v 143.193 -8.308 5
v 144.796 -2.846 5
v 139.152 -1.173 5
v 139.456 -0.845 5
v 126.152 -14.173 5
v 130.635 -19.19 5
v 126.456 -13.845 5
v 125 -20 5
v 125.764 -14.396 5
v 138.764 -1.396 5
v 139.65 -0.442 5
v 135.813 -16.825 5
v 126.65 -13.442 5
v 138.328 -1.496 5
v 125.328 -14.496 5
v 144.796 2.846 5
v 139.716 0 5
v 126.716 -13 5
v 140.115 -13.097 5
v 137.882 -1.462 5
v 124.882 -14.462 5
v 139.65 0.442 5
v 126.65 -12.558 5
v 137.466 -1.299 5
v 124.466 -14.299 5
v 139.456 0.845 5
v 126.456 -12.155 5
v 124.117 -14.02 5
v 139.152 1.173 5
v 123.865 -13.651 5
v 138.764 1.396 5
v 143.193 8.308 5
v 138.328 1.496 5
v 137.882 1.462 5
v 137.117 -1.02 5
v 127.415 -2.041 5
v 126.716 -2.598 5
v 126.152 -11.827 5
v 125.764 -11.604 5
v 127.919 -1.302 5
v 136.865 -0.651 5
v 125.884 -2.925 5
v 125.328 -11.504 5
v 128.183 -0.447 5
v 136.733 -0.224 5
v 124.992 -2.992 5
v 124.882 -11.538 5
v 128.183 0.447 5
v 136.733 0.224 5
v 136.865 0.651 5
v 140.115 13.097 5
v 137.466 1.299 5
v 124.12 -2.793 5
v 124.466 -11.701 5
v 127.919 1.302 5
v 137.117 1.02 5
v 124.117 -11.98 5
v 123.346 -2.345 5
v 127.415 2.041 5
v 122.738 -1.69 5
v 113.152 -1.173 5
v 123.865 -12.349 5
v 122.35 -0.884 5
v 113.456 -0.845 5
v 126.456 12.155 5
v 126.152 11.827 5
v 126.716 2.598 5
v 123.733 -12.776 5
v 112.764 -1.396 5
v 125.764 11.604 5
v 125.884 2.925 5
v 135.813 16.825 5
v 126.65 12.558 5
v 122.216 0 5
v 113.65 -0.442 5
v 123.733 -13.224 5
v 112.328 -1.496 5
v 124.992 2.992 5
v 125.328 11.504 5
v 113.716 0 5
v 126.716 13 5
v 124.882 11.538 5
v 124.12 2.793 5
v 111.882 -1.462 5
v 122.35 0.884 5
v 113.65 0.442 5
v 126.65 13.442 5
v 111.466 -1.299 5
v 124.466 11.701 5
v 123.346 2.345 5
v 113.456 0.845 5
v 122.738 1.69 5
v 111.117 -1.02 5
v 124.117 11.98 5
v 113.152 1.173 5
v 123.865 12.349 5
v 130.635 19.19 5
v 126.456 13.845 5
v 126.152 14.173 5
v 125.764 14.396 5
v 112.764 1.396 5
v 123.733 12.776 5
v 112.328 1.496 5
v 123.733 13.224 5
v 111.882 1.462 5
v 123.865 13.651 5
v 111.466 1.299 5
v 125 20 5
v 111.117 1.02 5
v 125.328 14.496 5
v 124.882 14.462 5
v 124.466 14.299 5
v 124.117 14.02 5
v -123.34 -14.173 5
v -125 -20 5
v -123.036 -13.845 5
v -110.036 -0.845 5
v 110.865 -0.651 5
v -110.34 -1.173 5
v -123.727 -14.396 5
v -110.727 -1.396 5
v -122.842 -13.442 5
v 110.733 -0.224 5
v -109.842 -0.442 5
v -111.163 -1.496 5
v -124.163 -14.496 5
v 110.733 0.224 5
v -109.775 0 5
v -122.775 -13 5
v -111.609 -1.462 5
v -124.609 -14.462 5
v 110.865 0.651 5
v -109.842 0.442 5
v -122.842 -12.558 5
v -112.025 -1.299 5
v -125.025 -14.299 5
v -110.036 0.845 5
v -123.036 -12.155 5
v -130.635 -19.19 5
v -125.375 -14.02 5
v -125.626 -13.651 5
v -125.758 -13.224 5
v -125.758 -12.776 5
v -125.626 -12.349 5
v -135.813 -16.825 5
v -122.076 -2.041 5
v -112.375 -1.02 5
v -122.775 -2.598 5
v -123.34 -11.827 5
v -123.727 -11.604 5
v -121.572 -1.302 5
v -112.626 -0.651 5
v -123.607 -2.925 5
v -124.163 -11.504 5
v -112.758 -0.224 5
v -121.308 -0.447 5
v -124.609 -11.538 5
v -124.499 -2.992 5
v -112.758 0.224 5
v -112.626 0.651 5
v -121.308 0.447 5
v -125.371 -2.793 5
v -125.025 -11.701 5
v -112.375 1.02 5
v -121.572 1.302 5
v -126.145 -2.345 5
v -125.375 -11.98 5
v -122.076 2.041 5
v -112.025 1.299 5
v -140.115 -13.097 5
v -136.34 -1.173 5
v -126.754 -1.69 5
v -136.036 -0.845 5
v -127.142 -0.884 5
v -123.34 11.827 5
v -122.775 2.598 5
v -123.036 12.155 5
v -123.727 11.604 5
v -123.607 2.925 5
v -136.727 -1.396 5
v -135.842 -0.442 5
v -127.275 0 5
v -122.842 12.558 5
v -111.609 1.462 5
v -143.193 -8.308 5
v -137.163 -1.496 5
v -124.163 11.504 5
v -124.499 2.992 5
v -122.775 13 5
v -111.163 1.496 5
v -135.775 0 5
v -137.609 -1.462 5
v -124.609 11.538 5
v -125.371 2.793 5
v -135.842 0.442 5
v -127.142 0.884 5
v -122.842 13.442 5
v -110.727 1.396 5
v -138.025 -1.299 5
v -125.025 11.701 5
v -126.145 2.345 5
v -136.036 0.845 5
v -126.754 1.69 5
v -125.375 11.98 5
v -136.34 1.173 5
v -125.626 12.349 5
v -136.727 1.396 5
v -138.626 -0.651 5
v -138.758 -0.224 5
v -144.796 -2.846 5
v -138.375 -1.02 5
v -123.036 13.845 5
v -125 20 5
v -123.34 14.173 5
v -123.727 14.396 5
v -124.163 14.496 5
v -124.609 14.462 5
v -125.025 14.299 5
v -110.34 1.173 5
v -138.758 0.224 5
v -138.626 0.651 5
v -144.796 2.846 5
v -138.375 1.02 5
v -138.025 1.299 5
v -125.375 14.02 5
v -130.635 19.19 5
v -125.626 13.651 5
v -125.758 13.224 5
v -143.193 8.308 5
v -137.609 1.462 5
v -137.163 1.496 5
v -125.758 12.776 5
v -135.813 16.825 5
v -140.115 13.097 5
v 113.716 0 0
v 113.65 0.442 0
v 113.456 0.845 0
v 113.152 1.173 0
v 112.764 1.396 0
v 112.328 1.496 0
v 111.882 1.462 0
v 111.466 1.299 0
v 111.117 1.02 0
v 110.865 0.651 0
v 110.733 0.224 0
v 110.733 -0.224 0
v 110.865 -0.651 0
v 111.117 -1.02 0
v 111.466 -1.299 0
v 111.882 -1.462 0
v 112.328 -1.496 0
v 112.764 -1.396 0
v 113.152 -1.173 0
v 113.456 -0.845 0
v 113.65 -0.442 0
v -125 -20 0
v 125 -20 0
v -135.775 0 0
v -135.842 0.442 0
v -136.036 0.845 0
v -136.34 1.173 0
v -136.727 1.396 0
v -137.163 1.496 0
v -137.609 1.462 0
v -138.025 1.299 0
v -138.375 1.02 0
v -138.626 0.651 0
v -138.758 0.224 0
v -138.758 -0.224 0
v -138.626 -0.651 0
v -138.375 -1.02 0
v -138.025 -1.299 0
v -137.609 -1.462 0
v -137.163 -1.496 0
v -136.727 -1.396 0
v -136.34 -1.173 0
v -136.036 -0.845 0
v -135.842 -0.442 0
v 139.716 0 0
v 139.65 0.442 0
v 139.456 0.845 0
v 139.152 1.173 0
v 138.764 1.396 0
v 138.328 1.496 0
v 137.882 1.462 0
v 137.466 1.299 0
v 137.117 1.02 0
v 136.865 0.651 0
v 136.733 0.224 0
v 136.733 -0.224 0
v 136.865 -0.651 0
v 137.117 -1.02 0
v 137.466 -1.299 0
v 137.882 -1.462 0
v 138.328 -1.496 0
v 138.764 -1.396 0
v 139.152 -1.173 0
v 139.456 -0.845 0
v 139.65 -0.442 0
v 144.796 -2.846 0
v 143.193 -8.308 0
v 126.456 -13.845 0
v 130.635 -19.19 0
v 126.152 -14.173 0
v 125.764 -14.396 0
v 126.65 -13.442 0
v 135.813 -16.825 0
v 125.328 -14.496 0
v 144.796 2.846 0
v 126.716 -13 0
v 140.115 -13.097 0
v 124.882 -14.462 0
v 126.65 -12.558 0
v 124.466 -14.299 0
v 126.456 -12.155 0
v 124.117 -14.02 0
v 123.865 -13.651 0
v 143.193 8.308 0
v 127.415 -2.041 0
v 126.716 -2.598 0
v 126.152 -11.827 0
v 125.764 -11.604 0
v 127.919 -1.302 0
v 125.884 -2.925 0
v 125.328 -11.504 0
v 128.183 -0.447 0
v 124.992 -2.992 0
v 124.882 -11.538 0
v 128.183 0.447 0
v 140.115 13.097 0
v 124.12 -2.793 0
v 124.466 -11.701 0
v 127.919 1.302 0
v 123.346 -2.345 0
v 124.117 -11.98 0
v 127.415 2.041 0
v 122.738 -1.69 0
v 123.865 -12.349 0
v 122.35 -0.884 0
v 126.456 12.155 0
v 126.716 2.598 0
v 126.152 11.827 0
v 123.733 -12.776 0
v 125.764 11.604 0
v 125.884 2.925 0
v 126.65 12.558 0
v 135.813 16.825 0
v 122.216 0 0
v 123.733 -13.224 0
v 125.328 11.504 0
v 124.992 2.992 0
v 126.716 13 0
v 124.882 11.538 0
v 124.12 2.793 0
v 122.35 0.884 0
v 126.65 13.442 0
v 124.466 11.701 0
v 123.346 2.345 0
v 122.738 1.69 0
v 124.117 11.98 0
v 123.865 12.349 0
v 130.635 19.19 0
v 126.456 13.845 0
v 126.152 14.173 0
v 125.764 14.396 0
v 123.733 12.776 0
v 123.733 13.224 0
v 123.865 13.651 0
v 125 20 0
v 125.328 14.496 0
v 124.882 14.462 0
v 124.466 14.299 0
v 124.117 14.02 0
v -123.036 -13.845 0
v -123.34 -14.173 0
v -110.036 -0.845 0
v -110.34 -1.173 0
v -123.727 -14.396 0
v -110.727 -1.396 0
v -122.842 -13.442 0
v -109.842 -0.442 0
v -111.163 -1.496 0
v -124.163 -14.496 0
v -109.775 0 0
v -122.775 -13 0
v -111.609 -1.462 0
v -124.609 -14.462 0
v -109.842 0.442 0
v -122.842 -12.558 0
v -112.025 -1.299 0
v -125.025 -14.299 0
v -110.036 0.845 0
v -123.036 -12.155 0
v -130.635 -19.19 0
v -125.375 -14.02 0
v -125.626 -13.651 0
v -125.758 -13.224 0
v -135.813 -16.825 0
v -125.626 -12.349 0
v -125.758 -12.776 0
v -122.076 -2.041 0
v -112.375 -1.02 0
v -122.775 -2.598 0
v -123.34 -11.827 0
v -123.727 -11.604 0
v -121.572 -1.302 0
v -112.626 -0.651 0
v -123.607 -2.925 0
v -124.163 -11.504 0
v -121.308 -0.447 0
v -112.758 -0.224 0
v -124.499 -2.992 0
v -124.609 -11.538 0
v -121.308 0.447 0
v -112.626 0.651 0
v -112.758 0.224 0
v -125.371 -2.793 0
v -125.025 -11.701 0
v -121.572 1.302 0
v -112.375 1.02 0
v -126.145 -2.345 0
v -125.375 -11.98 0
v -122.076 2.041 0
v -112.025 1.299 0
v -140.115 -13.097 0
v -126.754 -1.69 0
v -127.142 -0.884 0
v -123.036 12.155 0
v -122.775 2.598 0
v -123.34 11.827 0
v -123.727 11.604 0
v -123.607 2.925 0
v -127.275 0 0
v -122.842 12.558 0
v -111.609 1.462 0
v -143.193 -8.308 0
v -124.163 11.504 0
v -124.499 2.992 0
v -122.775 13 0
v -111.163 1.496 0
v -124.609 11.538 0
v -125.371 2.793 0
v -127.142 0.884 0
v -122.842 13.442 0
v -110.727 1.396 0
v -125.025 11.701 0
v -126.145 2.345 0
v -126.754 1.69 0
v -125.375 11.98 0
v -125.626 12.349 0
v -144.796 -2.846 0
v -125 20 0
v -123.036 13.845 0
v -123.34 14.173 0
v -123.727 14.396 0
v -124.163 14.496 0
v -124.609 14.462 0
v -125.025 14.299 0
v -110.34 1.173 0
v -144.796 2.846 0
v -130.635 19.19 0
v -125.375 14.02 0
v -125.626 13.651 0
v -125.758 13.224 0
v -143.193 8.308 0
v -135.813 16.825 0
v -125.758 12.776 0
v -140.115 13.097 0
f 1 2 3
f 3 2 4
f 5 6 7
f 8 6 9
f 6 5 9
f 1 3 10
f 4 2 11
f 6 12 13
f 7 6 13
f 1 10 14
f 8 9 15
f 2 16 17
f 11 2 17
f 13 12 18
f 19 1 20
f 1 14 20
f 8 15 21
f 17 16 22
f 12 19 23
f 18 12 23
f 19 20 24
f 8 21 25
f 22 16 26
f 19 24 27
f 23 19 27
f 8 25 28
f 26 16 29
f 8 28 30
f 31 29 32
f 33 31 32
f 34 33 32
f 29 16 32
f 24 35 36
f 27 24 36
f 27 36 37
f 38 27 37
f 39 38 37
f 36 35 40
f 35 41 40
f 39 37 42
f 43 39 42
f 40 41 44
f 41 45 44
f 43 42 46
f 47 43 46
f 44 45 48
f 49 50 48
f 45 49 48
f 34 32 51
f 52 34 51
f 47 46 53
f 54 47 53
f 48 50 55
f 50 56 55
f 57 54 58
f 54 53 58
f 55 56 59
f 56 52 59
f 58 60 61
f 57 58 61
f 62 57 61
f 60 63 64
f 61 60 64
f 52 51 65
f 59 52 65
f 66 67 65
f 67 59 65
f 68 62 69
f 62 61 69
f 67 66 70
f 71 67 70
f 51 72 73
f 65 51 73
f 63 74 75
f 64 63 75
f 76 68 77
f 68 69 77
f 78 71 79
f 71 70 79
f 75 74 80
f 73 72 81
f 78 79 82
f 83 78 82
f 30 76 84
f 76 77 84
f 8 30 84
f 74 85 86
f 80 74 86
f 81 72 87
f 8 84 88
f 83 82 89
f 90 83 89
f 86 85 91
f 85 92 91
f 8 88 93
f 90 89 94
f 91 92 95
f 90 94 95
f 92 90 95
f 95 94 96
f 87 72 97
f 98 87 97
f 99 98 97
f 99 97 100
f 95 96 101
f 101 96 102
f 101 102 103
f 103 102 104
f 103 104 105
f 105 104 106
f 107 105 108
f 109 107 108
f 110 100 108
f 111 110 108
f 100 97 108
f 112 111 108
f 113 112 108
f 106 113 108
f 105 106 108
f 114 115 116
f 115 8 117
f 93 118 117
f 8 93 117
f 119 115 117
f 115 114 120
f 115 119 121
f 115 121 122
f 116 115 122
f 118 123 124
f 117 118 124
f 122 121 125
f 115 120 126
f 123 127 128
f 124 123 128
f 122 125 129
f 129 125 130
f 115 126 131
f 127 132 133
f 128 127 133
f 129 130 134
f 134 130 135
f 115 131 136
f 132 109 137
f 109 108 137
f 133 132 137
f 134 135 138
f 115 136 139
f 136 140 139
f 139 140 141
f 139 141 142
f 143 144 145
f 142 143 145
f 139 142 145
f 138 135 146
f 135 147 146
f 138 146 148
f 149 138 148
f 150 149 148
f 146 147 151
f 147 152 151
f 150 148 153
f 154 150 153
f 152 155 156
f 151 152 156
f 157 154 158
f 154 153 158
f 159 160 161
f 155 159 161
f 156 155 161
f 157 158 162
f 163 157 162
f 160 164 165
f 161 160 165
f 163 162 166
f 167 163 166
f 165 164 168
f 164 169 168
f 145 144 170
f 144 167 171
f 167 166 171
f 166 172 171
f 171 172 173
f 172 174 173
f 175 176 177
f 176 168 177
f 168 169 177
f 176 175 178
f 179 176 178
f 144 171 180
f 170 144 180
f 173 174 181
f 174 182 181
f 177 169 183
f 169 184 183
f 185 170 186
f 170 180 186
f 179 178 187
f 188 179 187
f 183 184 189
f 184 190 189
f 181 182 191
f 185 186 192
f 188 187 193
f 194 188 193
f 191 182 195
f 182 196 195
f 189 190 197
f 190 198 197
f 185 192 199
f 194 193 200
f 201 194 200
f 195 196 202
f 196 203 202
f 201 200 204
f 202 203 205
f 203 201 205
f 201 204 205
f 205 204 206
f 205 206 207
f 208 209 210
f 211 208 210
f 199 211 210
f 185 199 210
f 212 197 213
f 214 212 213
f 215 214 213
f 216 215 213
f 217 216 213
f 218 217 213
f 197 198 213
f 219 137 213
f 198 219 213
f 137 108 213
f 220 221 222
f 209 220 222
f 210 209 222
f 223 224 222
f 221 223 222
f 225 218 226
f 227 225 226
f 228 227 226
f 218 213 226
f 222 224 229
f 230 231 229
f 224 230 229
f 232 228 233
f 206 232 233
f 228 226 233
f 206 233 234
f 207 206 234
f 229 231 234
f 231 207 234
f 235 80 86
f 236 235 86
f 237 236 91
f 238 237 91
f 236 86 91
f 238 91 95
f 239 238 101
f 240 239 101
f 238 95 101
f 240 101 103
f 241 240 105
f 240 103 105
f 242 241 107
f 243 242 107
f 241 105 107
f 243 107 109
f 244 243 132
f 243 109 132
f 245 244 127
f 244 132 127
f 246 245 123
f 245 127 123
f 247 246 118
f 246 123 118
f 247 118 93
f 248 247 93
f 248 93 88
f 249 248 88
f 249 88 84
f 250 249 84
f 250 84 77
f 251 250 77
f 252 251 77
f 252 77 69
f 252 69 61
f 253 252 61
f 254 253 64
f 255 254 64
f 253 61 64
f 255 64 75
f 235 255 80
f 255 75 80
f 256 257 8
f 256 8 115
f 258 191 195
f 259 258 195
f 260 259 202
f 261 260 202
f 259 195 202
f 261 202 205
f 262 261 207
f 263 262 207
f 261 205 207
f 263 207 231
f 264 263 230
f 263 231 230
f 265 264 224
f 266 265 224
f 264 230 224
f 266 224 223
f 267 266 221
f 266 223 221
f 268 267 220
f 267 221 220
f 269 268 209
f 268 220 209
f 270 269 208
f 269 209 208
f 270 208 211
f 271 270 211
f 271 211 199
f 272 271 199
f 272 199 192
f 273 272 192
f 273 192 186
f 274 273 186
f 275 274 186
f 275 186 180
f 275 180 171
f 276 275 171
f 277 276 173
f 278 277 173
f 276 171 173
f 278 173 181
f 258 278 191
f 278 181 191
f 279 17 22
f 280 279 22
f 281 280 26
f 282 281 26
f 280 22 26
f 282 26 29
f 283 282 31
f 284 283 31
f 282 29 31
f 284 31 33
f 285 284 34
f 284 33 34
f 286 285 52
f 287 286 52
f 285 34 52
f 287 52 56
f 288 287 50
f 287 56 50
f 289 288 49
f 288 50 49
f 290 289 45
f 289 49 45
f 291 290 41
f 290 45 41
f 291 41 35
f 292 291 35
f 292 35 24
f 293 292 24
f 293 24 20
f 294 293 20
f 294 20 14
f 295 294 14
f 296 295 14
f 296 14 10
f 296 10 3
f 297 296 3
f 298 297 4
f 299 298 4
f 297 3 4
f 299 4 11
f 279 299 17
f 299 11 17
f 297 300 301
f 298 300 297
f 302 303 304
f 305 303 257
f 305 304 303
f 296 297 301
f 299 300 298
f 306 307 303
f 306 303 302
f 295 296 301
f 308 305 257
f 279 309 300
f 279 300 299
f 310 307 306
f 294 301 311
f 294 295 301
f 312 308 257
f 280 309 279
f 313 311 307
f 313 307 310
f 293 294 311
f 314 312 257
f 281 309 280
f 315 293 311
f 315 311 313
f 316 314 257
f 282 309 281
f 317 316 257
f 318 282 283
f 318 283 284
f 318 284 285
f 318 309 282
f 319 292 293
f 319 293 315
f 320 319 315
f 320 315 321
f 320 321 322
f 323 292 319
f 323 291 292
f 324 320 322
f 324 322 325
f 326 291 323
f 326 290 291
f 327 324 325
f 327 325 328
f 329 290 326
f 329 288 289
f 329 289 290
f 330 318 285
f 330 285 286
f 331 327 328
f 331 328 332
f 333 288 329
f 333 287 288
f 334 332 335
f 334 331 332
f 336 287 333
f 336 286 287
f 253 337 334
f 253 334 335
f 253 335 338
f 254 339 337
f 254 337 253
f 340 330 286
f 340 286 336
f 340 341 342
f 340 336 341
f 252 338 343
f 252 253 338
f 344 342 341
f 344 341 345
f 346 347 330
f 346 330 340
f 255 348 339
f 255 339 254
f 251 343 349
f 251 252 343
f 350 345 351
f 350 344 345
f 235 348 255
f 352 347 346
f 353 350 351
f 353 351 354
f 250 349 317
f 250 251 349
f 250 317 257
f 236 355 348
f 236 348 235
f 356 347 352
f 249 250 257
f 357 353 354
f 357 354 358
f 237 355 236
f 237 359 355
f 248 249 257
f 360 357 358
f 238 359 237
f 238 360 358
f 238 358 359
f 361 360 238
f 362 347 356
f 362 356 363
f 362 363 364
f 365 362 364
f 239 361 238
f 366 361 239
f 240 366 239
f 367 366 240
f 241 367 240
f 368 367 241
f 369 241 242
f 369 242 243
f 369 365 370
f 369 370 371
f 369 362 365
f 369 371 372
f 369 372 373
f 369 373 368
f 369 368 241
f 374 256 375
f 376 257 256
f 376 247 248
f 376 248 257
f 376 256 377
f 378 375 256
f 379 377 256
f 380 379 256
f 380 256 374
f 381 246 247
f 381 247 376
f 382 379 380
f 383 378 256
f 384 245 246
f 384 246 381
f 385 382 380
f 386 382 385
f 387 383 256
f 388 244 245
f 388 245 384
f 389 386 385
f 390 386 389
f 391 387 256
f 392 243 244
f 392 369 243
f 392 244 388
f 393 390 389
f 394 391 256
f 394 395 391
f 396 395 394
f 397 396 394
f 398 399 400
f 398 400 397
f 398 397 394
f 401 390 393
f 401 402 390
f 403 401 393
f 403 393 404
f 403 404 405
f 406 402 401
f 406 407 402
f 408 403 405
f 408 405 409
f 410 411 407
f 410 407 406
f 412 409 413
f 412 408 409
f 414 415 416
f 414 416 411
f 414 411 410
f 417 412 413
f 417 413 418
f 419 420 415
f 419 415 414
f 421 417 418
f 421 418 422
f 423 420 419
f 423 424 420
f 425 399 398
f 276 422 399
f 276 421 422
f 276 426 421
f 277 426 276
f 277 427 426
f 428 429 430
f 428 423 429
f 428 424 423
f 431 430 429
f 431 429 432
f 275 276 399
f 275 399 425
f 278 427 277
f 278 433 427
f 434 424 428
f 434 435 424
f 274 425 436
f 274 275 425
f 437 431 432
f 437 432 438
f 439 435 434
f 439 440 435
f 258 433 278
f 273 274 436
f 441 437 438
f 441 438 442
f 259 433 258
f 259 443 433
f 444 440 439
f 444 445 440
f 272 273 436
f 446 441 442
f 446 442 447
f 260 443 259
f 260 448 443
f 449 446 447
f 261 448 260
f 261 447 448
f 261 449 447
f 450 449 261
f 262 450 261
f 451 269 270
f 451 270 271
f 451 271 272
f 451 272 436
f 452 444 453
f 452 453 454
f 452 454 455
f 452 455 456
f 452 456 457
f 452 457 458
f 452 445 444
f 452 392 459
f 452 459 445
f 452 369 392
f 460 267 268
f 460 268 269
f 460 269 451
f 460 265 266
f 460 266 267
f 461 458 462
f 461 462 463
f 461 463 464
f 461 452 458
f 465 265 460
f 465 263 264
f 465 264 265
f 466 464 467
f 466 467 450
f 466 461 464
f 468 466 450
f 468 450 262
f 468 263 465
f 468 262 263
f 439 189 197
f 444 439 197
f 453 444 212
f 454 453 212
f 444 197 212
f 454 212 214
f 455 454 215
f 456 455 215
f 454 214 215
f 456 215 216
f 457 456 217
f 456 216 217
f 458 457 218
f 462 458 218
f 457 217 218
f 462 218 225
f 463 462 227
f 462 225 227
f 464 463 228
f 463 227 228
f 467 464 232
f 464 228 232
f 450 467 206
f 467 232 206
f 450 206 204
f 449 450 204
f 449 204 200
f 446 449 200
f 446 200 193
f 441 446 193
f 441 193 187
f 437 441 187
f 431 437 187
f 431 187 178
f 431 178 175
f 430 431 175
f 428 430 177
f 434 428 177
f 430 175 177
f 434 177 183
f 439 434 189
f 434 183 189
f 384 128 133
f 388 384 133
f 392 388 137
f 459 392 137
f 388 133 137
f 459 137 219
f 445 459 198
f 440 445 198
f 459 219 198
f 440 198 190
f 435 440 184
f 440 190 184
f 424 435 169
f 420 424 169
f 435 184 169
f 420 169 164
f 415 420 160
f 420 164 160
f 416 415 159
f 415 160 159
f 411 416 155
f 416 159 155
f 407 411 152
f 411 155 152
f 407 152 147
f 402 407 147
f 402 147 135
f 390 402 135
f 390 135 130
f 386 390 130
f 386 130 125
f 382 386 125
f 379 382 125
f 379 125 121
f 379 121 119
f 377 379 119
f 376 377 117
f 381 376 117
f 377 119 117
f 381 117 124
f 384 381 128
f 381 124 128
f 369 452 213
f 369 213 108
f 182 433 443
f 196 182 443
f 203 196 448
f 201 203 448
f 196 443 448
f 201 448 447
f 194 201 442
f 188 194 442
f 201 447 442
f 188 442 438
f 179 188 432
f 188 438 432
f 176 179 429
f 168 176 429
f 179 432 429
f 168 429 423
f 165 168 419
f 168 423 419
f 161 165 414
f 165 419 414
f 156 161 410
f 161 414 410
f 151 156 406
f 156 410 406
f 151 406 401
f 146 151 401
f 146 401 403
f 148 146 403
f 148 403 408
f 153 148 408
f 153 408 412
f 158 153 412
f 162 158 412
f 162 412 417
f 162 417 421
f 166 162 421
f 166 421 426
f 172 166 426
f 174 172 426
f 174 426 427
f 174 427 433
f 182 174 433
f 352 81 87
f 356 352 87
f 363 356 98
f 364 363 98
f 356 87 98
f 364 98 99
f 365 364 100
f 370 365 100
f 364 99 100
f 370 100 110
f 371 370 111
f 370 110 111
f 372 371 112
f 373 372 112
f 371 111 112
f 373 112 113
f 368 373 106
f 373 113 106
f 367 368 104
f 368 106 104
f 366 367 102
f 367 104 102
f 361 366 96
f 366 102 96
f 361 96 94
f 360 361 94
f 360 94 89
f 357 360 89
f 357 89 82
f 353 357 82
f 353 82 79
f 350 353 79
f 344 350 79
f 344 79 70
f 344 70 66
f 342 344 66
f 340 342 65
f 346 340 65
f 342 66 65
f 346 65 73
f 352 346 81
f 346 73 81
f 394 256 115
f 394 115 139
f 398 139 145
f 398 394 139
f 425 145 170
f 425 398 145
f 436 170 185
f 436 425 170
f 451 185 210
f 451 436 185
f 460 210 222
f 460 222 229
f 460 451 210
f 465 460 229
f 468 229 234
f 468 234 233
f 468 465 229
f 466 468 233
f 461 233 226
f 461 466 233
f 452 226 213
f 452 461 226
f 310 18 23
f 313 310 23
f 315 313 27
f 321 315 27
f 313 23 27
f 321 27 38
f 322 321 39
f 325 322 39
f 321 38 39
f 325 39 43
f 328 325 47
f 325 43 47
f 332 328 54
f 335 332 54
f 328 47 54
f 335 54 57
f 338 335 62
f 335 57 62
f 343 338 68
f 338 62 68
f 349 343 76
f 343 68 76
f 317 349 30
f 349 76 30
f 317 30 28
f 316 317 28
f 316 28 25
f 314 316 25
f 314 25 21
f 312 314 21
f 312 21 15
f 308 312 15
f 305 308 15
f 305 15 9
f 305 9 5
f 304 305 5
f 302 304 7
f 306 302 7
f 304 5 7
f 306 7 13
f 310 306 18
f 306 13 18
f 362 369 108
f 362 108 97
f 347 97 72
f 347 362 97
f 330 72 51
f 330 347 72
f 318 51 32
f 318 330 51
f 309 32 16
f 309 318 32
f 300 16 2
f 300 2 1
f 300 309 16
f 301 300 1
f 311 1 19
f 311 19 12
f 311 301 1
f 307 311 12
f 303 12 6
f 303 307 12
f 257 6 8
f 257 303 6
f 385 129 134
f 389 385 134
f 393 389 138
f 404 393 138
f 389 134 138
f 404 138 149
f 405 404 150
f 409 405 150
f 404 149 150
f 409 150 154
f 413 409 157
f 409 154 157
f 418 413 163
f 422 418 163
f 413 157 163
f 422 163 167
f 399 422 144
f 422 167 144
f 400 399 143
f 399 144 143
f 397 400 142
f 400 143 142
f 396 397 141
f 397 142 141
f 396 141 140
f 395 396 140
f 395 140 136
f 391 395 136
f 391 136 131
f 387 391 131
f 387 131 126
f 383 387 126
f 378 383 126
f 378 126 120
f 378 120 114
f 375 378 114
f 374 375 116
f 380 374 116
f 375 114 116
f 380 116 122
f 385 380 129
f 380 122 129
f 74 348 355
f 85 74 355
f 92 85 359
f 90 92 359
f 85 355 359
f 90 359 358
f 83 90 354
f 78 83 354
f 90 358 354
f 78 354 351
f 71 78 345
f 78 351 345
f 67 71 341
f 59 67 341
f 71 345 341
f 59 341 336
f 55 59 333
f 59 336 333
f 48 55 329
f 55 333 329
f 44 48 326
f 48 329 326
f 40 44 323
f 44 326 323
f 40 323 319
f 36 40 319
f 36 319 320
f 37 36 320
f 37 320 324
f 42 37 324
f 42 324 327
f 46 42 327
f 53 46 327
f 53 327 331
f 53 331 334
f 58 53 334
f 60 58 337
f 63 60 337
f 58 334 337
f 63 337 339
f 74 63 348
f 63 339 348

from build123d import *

# Parameters (mm, degrees)
BOSS_EXTRUDE1_DEPTH = 5
SKETCH2_R           = 1.5
CUT_EXTRUDE1_DEPTH  = 5
SKETCH3_R           = 3
CUT_EXTRUDE2_DEPTH  = 5
SKETCH4_R           = 3
CUT_EXTRUDE3_DEPTH  = 10


with BuildPart() as part:
    # Sketch1 → Boss-Extrude1 (new body)
    with BuildSketch(Plane.XY):
        with BuildLine():
            Line((125, -20), (-125, -20))
            ThreePointArc((-125, -20), (-145, 0), (-125, 20))
            Line((-125, 20), (125, 20))
            ThreePointArc((125, 20), (145, 0), (125, -20))
        make_face()
    extrude(amount=BOSS_EXTRUDE1_DEPTH)

    # Sketch2 → Cut-Extrude1 (cut)
    with BuildSketch(Plane.XY.offset(5)):
        with Locations((-124.274977314, 13)):
            Circle(SKETCH2_R)
        with Locations((-111.274977314, 0)):
            Circle(SKETCH2_R)
        with Locations((-124.274977314, -13)):
            Circle(SKETCH2_R)
        with Locations((-137.274977314, 0)):
            Circle(SKETCH2_R)
        with Locations((125.216266839, 13)):
            Circle(SKETCH2_R)
        with Locations((138.216266839, 0)):
            Circle(SKETCH2_R)
        with Locations((125.216266839, -13)):
            Circle(SKETCH2_R)
        with Locations((112.216266839, 0)):
            Circle(SKETCH2_R)
    extrude(amount=-CUT_EXTRUDE1_DEPTH, mode=Mode.SUBTRACT)

    # Sketch3 → Cut-Extrude2 (cut)
    with BuildSketch(Plane(origin=(0, 0, 0), x_dir=(-1, 0, 0), z_dir=(0, 0, -1))):
        with Locations((-125.216266839, 0)):
            Circle(SKETCH3_R)
    extrude(amount=-CUT_EXTRUDE2_DEPTH, mode=Mode.SUBTRACT)

    # Sketch4 → Cut-Extrude3 (cut)
    with BuildSketch(Plane(origin=(0, 0, 0), x_dir=(-1, 0, 0), z_dir=(0, 0, -1))):
        with Locations((124.274977314, 0)):
            Circle(SKETCH4_R)
    extrude(amount=-CUT_EXTRUDE3_DEPTH, mode=Mode.SUBTRACT)


solid = part.part
